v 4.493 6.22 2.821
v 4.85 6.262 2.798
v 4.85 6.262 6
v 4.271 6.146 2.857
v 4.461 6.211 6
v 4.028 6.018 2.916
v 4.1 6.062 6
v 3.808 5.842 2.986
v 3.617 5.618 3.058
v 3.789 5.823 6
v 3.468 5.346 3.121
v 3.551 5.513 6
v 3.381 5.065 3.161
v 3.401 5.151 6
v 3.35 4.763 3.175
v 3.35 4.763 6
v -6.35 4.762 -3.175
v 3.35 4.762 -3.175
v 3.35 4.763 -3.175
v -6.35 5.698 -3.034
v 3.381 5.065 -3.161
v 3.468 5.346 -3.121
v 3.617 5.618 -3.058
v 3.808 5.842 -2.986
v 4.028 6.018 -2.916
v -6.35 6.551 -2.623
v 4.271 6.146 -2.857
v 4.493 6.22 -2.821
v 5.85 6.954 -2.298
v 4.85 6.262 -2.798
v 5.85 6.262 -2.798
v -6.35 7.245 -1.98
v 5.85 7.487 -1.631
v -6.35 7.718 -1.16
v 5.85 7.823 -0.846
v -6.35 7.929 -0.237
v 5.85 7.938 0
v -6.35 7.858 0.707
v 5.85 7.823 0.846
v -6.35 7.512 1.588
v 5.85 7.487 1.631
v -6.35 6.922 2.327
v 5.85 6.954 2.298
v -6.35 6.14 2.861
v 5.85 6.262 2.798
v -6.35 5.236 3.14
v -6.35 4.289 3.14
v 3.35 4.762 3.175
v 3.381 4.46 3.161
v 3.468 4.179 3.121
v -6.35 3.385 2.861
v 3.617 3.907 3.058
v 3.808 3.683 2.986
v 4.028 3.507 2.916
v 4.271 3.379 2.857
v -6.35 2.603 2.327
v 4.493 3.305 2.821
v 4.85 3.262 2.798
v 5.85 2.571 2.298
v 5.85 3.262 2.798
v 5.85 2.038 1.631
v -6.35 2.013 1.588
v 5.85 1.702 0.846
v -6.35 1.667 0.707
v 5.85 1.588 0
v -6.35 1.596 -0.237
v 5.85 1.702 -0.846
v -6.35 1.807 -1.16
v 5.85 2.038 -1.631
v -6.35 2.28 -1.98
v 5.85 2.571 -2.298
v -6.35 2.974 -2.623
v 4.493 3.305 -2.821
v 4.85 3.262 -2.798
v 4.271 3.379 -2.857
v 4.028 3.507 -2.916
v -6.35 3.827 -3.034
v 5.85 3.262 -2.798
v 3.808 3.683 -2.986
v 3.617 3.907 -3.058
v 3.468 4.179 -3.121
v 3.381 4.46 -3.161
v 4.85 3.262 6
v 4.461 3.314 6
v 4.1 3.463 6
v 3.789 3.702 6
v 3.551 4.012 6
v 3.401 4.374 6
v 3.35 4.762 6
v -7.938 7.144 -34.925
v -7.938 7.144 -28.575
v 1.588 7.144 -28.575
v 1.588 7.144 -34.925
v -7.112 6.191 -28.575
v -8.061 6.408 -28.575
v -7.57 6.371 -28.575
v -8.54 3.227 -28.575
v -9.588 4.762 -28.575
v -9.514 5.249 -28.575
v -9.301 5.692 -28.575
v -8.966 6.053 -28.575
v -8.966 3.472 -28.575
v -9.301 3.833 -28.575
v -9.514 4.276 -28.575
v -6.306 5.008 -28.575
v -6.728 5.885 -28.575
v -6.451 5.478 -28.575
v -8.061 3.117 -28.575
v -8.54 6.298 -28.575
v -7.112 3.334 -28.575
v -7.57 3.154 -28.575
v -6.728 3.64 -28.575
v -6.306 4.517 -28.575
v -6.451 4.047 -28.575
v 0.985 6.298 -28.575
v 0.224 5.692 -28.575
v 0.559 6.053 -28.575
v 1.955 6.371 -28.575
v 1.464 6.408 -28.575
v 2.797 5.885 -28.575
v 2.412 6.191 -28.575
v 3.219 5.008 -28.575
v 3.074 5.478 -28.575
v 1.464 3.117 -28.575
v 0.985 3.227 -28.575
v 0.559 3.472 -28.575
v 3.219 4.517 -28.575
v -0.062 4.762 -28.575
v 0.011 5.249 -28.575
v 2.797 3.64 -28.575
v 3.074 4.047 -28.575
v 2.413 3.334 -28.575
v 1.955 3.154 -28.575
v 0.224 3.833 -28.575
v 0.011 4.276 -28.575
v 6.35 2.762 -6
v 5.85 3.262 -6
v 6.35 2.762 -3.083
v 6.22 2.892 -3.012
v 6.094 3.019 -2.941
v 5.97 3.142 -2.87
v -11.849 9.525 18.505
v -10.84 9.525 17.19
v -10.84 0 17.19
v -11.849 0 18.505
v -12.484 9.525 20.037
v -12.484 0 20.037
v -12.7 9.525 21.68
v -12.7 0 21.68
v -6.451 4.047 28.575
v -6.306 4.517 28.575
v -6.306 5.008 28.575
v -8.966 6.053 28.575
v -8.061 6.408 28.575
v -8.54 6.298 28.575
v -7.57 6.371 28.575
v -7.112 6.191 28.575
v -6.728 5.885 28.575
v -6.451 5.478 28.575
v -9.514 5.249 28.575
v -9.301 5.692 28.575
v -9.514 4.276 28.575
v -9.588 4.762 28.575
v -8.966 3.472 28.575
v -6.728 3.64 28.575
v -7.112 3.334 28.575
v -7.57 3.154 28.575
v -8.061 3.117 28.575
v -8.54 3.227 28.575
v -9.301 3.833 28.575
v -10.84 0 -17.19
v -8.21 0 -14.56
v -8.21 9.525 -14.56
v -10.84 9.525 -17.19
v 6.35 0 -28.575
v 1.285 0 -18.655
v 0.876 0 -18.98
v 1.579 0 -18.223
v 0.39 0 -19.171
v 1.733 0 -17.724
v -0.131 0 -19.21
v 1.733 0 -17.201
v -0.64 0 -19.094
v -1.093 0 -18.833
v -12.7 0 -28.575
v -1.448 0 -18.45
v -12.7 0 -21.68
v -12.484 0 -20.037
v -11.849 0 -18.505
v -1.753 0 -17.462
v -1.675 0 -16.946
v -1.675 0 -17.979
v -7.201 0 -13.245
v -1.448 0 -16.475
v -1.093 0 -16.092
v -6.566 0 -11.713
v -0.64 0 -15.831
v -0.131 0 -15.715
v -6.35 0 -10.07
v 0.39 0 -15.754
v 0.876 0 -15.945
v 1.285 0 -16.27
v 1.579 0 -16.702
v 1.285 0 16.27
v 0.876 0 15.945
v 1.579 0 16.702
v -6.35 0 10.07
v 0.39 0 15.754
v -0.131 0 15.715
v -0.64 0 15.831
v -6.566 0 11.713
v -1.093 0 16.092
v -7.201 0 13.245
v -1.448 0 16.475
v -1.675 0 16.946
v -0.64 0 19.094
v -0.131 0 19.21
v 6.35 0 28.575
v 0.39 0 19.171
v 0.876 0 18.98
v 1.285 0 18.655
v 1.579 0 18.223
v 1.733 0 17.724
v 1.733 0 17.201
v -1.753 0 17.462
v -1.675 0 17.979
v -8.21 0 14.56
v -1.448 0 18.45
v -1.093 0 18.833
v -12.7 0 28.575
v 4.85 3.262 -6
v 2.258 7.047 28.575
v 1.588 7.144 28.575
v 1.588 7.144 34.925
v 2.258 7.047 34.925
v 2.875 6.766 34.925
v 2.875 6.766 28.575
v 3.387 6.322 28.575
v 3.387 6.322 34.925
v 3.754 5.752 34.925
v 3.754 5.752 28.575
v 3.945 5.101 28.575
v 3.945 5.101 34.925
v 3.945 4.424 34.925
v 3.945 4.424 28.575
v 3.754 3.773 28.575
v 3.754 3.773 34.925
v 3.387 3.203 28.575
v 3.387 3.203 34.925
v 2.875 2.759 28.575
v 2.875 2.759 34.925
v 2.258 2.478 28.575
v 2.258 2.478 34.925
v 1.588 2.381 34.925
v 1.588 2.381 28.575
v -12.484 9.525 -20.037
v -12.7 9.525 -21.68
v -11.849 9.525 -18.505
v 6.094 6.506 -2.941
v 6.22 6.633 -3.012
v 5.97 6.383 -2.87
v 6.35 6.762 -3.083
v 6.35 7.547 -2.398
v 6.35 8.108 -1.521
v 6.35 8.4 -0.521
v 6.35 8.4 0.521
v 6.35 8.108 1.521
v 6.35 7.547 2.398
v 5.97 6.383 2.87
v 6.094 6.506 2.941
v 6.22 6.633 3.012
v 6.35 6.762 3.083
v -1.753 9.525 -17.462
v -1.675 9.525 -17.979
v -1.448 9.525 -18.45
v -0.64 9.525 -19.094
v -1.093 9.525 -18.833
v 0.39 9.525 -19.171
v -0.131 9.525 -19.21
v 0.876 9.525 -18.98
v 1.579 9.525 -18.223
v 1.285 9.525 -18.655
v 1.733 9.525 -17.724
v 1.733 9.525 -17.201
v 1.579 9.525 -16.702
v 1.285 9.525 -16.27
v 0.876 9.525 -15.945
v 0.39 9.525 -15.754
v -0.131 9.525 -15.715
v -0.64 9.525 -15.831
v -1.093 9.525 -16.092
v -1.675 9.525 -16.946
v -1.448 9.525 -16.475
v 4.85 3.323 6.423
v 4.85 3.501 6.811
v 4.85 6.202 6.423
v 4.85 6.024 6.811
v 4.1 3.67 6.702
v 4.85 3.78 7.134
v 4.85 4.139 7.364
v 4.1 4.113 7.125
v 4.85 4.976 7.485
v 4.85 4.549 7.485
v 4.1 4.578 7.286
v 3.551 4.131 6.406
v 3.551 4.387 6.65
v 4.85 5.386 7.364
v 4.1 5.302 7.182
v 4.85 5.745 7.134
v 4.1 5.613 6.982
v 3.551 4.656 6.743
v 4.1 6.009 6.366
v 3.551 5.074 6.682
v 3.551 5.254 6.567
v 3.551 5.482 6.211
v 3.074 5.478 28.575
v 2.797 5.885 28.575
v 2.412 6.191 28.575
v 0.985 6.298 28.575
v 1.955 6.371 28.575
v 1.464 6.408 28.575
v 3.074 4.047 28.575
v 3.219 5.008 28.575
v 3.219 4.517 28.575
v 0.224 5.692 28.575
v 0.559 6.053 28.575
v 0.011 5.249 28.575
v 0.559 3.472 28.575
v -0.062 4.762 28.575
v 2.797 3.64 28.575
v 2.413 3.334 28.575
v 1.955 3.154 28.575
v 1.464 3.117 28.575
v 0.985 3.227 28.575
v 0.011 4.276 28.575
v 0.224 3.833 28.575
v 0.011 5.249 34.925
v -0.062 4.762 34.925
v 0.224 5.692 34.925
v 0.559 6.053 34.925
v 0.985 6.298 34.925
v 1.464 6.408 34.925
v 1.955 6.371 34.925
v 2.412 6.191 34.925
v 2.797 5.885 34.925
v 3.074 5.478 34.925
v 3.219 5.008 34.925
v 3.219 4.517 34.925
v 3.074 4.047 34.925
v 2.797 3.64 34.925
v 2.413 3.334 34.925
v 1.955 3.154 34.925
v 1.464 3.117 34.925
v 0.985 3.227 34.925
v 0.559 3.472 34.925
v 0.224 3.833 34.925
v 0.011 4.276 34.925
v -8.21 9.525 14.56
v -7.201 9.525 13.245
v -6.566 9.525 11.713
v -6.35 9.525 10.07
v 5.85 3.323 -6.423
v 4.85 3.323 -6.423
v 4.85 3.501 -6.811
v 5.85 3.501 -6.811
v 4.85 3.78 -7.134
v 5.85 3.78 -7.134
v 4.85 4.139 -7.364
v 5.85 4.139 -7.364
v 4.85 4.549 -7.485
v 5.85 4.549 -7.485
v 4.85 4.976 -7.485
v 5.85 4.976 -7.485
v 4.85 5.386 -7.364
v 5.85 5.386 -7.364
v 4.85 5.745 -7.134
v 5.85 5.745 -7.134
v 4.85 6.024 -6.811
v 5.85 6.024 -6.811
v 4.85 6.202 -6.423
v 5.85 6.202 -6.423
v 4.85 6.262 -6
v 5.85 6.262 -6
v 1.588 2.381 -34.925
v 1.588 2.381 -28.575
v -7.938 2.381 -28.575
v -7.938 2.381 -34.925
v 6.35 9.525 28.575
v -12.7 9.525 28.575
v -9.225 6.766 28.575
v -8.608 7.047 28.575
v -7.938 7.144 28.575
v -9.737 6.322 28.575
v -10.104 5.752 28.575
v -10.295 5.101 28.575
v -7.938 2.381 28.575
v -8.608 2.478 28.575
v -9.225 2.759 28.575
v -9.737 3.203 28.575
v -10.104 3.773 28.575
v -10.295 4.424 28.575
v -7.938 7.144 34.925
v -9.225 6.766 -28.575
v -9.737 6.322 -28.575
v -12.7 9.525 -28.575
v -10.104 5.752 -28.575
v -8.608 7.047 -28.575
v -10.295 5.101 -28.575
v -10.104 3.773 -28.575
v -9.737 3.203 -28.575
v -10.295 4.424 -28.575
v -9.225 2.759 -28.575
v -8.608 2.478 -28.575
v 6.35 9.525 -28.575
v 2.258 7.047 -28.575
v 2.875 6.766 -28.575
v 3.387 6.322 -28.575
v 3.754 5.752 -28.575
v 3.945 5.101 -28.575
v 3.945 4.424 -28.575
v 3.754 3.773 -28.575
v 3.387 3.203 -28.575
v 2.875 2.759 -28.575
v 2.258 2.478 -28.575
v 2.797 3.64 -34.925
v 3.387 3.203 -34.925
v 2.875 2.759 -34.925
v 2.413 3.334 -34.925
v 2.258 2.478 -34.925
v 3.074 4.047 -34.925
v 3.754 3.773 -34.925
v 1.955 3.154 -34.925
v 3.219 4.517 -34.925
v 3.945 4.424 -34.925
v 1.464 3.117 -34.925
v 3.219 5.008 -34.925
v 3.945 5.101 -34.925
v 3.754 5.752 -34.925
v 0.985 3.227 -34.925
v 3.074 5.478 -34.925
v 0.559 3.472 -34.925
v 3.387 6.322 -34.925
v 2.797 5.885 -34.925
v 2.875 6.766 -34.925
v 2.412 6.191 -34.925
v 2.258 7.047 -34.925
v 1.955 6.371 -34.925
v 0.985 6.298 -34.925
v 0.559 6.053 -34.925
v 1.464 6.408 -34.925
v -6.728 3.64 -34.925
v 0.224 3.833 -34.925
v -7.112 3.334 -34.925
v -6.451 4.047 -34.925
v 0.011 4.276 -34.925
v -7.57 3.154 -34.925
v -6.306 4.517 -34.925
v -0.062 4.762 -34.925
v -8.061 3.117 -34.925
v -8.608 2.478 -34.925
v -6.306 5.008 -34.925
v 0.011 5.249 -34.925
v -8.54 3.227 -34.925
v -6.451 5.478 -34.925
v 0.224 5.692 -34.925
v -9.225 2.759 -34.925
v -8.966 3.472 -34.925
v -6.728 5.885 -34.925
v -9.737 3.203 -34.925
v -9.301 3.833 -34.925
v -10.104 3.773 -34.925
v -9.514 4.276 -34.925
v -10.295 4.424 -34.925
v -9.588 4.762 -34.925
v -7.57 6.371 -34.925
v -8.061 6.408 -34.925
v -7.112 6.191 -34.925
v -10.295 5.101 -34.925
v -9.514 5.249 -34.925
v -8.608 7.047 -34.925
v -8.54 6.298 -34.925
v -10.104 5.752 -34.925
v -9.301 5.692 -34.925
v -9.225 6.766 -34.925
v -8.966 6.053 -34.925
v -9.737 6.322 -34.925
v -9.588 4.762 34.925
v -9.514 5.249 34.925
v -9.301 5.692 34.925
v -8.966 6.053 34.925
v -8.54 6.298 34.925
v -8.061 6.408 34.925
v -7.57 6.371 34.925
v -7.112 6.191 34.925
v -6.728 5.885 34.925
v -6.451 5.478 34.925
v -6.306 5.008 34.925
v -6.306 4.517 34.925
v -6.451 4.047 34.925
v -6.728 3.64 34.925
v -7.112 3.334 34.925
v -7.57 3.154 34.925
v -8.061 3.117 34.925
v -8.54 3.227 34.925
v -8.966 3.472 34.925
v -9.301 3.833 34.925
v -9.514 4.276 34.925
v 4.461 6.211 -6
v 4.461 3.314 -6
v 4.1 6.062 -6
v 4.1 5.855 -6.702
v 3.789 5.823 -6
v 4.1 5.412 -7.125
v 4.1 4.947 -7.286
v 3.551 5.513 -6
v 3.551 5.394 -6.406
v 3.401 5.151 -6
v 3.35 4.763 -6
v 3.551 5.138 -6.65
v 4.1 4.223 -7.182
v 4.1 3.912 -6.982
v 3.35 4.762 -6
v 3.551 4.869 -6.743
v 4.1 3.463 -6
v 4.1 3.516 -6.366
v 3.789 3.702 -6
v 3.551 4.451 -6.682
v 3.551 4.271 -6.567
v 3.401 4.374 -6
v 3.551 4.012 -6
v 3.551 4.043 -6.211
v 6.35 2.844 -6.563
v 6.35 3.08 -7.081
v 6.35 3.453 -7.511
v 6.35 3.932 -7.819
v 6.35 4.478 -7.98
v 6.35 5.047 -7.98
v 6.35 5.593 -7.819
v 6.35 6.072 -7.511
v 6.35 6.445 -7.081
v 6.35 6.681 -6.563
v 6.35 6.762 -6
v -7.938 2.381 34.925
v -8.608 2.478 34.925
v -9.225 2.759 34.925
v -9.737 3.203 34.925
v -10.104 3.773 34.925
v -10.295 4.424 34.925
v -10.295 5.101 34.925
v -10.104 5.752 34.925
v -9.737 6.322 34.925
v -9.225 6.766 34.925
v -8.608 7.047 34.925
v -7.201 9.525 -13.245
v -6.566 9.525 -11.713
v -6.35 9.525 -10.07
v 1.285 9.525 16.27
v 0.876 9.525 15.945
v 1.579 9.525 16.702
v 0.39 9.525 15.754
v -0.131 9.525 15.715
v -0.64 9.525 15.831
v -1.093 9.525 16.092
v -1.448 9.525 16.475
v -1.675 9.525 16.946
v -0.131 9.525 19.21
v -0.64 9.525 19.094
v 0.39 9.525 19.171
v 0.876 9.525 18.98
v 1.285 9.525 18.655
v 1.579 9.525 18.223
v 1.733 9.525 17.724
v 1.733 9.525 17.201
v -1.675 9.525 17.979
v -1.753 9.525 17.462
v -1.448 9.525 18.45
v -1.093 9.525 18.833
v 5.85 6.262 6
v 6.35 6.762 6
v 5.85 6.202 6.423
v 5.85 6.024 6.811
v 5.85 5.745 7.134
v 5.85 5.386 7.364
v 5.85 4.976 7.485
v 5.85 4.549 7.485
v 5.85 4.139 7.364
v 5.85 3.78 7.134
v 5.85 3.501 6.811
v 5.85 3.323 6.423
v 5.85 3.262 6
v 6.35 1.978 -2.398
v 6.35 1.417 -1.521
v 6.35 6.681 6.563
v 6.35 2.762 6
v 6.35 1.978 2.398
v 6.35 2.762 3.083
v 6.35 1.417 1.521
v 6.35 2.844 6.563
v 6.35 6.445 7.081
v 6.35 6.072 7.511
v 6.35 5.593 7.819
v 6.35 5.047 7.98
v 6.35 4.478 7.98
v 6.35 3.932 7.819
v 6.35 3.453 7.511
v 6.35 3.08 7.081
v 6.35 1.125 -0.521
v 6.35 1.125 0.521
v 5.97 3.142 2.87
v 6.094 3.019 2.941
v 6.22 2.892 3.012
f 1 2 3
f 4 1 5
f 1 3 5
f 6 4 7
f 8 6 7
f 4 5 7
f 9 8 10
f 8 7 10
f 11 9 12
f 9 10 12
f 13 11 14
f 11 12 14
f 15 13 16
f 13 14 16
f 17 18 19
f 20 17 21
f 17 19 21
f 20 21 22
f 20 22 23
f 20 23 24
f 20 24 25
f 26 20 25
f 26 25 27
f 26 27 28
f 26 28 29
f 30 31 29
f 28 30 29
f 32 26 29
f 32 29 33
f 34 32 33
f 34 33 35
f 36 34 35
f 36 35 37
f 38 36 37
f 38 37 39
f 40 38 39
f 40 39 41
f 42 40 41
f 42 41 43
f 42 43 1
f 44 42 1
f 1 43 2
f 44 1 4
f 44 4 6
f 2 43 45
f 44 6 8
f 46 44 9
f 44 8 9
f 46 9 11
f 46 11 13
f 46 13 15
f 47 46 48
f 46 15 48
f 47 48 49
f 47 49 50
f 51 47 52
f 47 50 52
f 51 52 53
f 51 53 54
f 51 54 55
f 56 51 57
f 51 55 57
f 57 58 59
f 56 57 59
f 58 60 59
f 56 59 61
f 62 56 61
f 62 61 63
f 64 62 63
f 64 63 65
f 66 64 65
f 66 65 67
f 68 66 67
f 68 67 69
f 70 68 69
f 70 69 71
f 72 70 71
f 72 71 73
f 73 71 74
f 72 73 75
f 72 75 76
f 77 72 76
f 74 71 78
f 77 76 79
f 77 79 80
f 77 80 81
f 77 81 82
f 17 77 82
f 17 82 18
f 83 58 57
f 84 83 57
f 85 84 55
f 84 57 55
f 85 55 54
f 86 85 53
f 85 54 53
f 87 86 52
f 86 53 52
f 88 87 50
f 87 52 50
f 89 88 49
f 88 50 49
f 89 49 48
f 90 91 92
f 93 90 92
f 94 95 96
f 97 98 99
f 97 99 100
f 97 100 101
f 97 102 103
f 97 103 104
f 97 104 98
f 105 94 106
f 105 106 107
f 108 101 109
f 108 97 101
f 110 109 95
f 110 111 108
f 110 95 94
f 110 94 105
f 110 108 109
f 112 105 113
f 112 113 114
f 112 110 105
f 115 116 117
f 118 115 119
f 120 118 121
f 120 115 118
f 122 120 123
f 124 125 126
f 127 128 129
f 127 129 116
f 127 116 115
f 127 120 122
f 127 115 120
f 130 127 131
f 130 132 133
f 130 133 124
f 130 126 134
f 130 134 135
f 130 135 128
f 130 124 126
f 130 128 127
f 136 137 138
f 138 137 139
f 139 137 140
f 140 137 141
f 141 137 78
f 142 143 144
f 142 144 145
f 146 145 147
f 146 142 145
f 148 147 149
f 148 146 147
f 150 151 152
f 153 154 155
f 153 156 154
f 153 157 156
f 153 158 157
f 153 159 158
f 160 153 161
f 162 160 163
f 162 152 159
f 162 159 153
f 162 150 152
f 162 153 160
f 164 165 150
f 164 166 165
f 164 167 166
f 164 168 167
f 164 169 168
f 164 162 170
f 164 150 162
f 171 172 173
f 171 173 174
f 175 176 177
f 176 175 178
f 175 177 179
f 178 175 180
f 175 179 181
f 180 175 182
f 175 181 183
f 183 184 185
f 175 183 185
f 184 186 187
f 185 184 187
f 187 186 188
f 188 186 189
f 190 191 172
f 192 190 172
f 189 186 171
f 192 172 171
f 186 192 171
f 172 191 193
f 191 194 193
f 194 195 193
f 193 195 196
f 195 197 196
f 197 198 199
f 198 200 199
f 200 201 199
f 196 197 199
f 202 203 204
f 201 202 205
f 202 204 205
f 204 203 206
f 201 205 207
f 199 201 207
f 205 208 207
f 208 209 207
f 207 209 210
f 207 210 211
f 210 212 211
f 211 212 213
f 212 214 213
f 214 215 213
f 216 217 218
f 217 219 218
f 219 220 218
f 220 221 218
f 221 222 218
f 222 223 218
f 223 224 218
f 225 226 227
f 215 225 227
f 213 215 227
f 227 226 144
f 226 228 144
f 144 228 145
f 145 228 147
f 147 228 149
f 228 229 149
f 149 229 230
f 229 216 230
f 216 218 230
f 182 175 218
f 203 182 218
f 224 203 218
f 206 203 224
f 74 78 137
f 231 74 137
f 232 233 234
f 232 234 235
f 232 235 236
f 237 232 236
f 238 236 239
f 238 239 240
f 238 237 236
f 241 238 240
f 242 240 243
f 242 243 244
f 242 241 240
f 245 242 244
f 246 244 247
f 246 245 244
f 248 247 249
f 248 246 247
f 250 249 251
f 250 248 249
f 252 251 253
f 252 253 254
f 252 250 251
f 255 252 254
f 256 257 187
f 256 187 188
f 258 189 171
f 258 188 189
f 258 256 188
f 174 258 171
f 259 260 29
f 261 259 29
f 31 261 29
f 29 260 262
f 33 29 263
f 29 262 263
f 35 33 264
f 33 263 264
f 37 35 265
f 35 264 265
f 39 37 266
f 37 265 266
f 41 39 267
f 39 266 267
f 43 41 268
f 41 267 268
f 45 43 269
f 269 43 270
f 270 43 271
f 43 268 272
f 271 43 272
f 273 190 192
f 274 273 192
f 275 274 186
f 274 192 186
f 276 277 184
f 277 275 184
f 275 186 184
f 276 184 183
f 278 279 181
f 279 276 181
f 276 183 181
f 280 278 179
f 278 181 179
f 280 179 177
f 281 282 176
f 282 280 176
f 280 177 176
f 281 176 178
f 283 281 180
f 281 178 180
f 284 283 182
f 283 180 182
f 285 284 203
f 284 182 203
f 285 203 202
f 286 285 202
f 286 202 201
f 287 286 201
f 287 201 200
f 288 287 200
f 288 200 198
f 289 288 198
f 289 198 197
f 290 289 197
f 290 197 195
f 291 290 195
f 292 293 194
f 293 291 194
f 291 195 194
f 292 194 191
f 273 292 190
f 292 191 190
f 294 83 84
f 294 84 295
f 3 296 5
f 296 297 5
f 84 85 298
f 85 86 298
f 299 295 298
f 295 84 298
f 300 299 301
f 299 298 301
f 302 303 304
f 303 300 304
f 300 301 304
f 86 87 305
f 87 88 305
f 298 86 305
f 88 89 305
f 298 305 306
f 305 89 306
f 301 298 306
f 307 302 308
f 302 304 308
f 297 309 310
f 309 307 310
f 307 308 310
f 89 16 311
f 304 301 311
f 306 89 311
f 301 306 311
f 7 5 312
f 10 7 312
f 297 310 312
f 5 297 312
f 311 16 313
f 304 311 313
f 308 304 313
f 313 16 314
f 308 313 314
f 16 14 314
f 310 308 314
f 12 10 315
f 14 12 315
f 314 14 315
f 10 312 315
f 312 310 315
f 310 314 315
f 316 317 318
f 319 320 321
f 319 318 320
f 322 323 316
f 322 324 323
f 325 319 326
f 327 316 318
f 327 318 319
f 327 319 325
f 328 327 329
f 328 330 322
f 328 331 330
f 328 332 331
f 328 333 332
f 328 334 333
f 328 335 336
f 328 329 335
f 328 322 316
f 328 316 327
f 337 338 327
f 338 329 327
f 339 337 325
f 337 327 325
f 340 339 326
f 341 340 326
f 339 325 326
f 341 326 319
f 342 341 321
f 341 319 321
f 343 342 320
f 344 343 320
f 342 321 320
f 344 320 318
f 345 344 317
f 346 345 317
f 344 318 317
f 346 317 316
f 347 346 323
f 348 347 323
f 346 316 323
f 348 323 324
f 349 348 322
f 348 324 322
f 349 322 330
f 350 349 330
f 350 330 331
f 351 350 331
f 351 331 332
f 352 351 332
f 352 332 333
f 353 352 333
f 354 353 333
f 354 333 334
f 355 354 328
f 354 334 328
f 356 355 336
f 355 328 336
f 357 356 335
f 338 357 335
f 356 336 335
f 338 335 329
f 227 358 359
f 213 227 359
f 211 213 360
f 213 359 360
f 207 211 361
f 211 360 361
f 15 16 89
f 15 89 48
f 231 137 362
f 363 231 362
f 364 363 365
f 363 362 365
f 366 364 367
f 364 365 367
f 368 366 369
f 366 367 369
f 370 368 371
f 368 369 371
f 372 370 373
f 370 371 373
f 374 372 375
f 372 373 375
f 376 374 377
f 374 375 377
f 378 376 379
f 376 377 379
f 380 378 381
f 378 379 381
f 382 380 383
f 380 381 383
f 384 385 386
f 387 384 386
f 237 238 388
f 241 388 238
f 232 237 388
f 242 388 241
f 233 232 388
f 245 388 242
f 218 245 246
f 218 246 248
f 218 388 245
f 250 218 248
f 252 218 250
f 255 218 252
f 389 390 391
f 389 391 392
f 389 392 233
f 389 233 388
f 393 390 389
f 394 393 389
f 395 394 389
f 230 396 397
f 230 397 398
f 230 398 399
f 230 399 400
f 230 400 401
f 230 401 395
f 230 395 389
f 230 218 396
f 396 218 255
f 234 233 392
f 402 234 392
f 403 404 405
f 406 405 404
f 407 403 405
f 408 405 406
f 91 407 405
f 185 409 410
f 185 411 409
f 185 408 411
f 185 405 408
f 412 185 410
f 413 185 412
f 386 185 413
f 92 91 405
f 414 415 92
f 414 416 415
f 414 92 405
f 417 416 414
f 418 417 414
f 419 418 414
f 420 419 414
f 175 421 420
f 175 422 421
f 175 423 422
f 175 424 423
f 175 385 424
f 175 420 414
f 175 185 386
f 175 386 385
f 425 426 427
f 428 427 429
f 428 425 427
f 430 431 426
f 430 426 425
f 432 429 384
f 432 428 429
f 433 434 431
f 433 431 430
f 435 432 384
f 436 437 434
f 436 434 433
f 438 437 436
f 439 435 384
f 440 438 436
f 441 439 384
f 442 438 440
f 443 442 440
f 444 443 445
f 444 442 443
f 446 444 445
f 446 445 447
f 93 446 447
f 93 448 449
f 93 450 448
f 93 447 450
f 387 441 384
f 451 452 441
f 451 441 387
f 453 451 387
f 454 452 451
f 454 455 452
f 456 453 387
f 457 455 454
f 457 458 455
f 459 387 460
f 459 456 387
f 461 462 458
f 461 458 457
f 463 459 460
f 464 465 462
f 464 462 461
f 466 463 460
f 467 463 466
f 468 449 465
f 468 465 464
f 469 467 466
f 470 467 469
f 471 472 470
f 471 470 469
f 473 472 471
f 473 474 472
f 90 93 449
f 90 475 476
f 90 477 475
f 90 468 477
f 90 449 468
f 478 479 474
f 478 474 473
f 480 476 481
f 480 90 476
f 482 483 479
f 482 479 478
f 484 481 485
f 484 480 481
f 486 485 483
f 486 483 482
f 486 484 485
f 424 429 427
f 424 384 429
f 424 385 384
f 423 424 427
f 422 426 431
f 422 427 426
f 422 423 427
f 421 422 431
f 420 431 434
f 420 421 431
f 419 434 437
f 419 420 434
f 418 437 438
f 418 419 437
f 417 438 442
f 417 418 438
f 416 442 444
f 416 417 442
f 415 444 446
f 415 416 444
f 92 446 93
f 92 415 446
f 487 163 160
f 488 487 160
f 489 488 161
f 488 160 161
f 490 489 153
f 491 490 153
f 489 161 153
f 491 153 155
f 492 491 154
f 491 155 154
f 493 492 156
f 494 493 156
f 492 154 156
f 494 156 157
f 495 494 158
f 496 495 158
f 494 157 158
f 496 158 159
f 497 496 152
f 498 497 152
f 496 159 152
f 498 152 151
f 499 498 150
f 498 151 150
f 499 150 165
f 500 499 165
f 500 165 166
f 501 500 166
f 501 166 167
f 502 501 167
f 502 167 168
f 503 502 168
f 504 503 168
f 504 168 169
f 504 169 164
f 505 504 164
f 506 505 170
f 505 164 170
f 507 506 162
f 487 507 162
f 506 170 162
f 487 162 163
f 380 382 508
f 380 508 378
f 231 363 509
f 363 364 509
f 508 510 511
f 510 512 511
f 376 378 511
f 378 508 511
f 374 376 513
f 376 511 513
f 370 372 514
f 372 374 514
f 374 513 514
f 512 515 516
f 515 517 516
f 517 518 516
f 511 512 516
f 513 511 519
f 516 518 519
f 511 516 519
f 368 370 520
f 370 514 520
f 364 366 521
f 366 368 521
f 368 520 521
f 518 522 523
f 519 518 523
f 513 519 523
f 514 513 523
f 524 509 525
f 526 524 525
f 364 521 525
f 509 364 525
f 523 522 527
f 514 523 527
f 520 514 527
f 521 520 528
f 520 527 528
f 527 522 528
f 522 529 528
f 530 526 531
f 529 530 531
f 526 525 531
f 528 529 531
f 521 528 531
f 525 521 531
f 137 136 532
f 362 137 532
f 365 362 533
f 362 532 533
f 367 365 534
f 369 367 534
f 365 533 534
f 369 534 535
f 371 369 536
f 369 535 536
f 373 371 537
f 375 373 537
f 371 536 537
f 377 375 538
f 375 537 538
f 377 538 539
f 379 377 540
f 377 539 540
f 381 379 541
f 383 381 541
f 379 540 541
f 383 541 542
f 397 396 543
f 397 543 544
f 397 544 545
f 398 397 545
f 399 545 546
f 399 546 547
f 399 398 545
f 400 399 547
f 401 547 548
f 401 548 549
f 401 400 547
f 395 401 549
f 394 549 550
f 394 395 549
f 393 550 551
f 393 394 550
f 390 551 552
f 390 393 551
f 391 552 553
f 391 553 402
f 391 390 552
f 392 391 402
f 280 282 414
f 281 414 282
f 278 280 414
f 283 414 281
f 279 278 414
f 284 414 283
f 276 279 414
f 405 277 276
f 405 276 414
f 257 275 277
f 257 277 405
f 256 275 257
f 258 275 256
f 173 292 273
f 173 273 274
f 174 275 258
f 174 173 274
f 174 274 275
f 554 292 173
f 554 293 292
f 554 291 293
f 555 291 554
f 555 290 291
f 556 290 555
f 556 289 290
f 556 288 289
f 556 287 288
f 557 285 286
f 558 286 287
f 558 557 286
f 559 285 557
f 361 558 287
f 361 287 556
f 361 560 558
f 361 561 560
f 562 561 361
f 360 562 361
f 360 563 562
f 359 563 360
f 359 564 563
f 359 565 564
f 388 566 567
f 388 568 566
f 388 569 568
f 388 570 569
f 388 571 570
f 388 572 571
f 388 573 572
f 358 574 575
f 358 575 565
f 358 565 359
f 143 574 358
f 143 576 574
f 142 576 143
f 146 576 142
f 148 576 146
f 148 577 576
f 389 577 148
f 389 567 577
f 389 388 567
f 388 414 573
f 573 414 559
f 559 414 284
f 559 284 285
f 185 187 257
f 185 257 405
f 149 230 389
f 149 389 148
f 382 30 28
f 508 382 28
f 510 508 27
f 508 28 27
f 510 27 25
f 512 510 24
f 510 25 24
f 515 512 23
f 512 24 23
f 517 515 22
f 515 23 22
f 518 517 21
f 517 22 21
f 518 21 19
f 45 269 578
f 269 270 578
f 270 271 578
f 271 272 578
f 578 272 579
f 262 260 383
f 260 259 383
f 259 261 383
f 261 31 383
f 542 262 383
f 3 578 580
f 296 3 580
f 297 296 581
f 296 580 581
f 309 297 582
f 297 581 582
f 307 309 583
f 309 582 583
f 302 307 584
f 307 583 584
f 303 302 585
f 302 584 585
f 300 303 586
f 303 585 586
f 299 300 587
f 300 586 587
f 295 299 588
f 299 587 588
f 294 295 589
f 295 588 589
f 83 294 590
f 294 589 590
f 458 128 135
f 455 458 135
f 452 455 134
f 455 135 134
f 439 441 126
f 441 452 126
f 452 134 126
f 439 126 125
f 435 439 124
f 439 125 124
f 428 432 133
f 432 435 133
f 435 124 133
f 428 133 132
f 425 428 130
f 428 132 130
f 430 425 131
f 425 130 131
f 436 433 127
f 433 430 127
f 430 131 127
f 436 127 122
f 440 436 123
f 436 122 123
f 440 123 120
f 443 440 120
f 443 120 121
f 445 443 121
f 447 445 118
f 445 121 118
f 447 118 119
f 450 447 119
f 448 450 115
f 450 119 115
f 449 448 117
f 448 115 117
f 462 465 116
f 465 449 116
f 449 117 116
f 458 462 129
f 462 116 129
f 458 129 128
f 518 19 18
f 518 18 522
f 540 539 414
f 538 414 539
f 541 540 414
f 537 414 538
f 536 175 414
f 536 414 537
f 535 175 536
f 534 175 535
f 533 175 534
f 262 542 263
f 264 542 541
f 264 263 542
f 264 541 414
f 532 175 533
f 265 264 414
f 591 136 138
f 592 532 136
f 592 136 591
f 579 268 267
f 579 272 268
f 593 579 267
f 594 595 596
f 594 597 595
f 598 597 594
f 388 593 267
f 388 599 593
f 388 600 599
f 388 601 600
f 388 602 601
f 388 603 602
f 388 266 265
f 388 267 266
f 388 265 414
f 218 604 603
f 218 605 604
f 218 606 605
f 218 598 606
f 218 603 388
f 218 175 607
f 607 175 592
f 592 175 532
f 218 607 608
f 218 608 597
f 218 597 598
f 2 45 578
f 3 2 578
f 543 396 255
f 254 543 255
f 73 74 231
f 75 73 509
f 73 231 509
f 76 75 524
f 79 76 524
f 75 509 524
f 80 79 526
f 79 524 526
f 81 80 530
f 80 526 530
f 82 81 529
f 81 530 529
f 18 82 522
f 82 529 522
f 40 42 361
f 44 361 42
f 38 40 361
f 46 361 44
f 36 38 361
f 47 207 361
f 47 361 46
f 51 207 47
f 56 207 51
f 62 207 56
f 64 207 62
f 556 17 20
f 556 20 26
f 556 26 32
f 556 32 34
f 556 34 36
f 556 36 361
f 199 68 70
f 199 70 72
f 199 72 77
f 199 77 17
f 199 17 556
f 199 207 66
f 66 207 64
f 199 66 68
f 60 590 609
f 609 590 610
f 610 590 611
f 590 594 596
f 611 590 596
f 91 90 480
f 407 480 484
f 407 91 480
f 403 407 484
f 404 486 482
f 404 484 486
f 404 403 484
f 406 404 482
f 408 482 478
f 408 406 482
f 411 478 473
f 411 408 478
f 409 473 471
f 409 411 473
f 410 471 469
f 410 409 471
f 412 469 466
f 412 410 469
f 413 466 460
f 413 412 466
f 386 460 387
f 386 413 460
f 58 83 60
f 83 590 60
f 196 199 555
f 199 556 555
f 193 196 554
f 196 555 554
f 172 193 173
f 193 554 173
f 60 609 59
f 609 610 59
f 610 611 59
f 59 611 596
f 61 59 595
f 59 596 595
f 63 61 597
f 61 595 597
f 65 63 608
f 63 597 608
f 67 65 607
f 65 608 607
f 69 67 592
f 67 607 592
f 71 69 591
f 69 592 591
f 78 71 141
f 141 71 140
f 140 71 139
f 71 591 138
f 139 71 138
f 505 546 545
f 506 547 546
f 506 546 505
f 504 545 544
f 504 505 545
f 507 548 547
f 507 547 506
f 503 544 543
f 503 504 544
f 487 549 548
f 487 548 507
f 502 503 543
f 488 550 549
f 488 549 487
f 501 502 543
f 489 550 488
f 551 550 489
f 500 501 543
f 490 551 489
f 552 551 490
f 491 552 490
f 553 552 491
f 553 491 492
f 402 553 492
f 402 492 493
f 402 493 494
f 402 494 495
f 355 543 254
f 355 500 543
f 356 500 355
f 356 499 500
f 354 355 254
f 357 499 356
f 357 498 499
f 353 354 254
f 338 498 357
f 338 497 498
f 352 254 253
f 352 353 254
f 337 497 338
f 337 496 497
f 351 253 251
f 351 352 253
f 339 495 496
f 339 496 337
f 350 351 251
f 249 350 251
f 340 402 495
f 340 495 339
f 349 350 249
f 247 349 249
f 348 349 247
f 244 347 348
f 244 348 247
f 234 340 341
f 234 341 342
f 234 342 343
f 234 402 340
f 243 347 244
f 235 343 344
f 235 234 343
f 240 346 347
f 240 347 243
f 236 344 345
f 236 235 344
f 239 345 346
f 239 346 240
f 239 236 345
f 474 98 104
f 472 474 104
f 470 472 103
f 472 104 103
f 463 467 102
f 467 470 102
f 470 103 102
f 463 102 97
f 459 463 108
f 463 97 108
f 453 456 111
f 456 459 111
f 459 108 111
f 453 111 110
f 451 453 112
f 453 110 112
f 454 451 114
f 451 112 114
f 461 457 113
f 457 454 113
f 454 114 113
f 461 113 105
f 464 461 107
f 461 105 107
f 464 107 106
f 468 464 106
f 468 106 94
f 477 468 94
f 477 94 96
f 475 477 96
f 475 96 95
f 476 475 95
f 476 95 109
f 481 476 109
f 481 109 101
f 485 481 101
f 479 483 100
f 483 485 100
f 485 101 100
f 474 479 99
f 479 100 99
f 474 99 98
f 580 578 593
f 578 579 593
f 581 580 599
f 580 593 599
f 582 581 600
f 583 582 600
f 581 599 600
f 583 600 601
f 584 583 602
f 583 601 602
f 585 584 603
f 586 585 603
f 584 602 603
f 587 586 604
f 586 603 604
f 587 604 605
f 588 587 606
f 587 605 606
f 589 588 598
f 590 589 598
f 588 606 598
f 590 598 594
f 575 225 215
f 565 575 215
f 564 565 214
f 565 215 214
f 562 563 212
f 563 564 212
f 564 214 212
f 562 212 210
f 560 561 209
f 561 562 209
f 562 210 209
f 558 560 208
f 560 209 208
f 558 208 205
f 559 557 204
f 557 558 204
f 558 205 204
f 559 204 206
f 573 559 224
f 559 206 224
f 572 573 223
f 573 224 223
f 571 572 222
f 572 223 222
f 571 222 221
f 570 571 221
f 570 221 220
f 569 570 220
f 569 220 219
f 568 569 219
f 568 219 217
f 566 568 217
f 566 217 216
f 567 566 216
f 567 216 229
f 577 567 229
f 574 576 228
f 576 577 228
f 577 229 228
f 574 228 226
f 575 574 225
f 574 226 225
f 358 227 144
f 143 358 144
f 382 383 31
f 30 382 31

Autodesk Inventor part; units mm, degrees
ref_plane "YZ Plane" through (0, 0, 0) normal (1, 0, 0) x (0, 1, 0)
ref_plane "XZ Plane" through (0, 0, 0) normal (0, 1, 0) x (-1, 0, 0)
ref_plane "XY Plane" through (0, 0, 0) normal (0, 0, 1) x (1, 0, 0)
sketch "Sketch1" plane through (0, 0, 0) normal (0, 1, 0) x (-1, 0, 0)
  line L0 (0, 17.4625) -> (0, 17.4625) construction
  line L1 (0, 17.4625) -> (0, -17.4625) construction
  line L2 (0, -17.4625) -> (0, -17.4625) construction
  line L3 (0, -17.4625) -> (0, 17.4625) construction
  line L4 (0, 17.4625) -> (0, -17.4625) construction
  line L5 (0, 17.4625) -> (0, -17.4625) construction
  circle A0 centre (0, 17.4625) radius 1.7526
  circle A1 centre (0, -17.4625) radius 1.7526
  circle A2 centre (0, 17.4625) radius 1.7526
  circle A3 centre (0, -17.4625) radius 1.7526
  line L6 (-6.35, 28.575) -> (6.35, 28.575)
  line L7 (6.35, 28.575) -> (6.35, -28.575)
  line L8 (6.35, -28.575) -> (-6.35, -28.575)
  line L9 (-6.35, -28.575) -> (-6.35, 28.575)
  line L10 (-6.35, 28.575) -> (6.35, -28.575) construction
  line L11 (6.35, 28.575) -> (-6.35, -28.575) construction
  line L12 (6.35, 28.575) -> (12.7, 28.575)
  line L13 (12.7, 28.575) -> (12.7, -28.575)
  line L14 (12.7, -28.575) -> (6.35, -28.575)
  line L15 (6.35, -28.575) -> (6.35, 28.575)
  line L16 (6.35, 12.7) -> (12.7, 19.05)
  line L17 (6.35, 0) -> (12.7, 0) construction
  line L18 (6.35, -12.7) -> (12.7, -19.05)
  point P0 (0, 0)
  point P1 (12.7, -19.05)
  dimension "d0" = 0
  dimension "d1" = 34.925
  dimension "d2" = 3.5052
  dimension "d5" = 34.925
  dimension "d8" = 0
  dimension "d11" = 12.7
  dimension "d12" = 57.15
  dimension "d40" = 6.35
  dimension "d41" = 9.525
  dimension "d42" = 12.7
extrude "Extrusion1" add sketch "Sketch1" along normal blind 9.525 contours L6 L7 L8 L9 | L12 L13 L16 L7 | L7 L18 L13 L14
sketch "Sketch2" plane through (6.35, 0, 28.575) normal (1, 0, 0) x (0, 0, -1)
  line L0 (28.575, 0) -> (28.575, 9.525) construction
  line L1 (41.275, 9.525) -> (15.875, 9.525) projected
  circle A0 centre (28.575, 4.7625) radius 3.175
  line L2 (0, 0) -> (57.15, 0) projected
  point P0 (57.15, 9.525)
  point P1 (0, 9.525)
  point P2 (25.4, 0)
  point P3 (16.2434, 0)
  dimension "d15" = 6.35
  dimension "d16" = 4.7625
extrude "Extrusion2" cut sketch "Sketch2" against normal through all
sketch "Sketch5" plane through (6.35, 0, 28.575) normal (1, 0, 0) x (0, 0, -1)
  line L0 (0, 0) -> (0, 9.525) projected
  line L1 (0, 4.7625) -> (57.15, 4.7625) construction
  line L2 (57.15, 0) -> (57.15, 9.525) projected
  line L3 (22.575, 4.7625) -> (34.575, 4.7625) construction
  line L4 (22.575, 3.2625) -> (34.575, 3.2625)
  line L5 (34.575, 6.2625) -> (22.575, 6.2625)
  arc A0 (22.575, 6.2625) -> (22.575, 3.2625) centre (22.575, 4.7625) ccw
  arc A1 (34.575, 3.2625) -> (34.575, 6.2625) centre (34.575, 4.7625) ccw
  point P0 (28.575, 0)
  point P1 (28.575, 4.7625)
  dimension "d29" = 3
  dimension "d30" = 12
extrude "Extrusion5" cut sketch "Sketch5" against normal blind 3
fillet "Fillet3" radius 1.5 6 edges at (3.35, 6.2625, 4.3992) (3.35, 3.2625, 4.3992) (3.35, 4.7625, 7.5) (3.35, 4.7625, -7.5) (3.35, 3.2625, -4.3992) (3.35, 6.2625, -4.3992)
chamfer "Chamfer1" distance 0.5 angle 45 8 edges at (6.35, 3.2625, -4.3992) (6.35, 4.7625, -7.5) (6.35, 6.2625, -4.3992) (6.35, 7.9375, 0) (6.35, 6.2625, 4.3992) (6.35, 4.7625, 7.5) (6.35, 3.2625, 4.3992) (6.35, 1.5875, 0)
fillet "Fillet4" radius 6.35 4 edges at (-6.35, 4.7625, 12.7) (-6.35, 4.7625, -12.7) (-12.7, 4.7625, 19.05) (-12.7, 4.7625, -19.05)
ref_plane "Work Plane1" through (6.35, 0, 0) normal (0, 0, -1) x (-1, 0, 0)
sketch "Sketch6" plane through (6.35, 0, -28.575) normal (0, 0, -1) x (-1, 0, 0)
  line L0 (0, 0) -> (0, 9.525) projected
  line L1 (0, 4.7625) -> (19.05, 4.7625) construction
  line L2 (19.05, 0) -> (19.05, 9.525) projected
  line L3 (4.7625, 4.7625) -> (14.2875, 4.7625) construction
  line L4 (4.7625, 2.3813) -> (14.2875, 2.3812)
  line L5 (14.2875, 7.1437) -> (4.7625, 7.1438)
  arc A0 (4.7625, 7.1438) -> (4.7625, 2.3813) centre (4.7625, 4.7625) ccw
  arc A1 (14.2875, 2.3812) -> (14.2875, 7.1437) centre (14.2875, 4.7625) ccw
  circle A2 centre (4.7625, 4.7625) radius 1.65
  circle A3 centre (14.2875, 4.7625) radius 1.65
  point P0 (6.35, 0)
  point P1 (9.525, 4.7625)
  dimension "d44" = 4.7625
  dimension "d45" = 4.7625
  dimension "d46" = 4.7625
  dimension "d47" = 3.3
  dimension "d48" = 3.3
extrude "Extrusion6" add sketch "Sketch6" along normal blind 6.35
mirror "Mirror1" about plane through (6.35, 0, 0) normal (0, 0, -1) of "Extrusion6"
equation "\"d5\" = d1"
equation "\"d45\" = d44"
equation "\"d46\" = d44"
properties part number "Rack - Top" material "Aluminum 6061"
